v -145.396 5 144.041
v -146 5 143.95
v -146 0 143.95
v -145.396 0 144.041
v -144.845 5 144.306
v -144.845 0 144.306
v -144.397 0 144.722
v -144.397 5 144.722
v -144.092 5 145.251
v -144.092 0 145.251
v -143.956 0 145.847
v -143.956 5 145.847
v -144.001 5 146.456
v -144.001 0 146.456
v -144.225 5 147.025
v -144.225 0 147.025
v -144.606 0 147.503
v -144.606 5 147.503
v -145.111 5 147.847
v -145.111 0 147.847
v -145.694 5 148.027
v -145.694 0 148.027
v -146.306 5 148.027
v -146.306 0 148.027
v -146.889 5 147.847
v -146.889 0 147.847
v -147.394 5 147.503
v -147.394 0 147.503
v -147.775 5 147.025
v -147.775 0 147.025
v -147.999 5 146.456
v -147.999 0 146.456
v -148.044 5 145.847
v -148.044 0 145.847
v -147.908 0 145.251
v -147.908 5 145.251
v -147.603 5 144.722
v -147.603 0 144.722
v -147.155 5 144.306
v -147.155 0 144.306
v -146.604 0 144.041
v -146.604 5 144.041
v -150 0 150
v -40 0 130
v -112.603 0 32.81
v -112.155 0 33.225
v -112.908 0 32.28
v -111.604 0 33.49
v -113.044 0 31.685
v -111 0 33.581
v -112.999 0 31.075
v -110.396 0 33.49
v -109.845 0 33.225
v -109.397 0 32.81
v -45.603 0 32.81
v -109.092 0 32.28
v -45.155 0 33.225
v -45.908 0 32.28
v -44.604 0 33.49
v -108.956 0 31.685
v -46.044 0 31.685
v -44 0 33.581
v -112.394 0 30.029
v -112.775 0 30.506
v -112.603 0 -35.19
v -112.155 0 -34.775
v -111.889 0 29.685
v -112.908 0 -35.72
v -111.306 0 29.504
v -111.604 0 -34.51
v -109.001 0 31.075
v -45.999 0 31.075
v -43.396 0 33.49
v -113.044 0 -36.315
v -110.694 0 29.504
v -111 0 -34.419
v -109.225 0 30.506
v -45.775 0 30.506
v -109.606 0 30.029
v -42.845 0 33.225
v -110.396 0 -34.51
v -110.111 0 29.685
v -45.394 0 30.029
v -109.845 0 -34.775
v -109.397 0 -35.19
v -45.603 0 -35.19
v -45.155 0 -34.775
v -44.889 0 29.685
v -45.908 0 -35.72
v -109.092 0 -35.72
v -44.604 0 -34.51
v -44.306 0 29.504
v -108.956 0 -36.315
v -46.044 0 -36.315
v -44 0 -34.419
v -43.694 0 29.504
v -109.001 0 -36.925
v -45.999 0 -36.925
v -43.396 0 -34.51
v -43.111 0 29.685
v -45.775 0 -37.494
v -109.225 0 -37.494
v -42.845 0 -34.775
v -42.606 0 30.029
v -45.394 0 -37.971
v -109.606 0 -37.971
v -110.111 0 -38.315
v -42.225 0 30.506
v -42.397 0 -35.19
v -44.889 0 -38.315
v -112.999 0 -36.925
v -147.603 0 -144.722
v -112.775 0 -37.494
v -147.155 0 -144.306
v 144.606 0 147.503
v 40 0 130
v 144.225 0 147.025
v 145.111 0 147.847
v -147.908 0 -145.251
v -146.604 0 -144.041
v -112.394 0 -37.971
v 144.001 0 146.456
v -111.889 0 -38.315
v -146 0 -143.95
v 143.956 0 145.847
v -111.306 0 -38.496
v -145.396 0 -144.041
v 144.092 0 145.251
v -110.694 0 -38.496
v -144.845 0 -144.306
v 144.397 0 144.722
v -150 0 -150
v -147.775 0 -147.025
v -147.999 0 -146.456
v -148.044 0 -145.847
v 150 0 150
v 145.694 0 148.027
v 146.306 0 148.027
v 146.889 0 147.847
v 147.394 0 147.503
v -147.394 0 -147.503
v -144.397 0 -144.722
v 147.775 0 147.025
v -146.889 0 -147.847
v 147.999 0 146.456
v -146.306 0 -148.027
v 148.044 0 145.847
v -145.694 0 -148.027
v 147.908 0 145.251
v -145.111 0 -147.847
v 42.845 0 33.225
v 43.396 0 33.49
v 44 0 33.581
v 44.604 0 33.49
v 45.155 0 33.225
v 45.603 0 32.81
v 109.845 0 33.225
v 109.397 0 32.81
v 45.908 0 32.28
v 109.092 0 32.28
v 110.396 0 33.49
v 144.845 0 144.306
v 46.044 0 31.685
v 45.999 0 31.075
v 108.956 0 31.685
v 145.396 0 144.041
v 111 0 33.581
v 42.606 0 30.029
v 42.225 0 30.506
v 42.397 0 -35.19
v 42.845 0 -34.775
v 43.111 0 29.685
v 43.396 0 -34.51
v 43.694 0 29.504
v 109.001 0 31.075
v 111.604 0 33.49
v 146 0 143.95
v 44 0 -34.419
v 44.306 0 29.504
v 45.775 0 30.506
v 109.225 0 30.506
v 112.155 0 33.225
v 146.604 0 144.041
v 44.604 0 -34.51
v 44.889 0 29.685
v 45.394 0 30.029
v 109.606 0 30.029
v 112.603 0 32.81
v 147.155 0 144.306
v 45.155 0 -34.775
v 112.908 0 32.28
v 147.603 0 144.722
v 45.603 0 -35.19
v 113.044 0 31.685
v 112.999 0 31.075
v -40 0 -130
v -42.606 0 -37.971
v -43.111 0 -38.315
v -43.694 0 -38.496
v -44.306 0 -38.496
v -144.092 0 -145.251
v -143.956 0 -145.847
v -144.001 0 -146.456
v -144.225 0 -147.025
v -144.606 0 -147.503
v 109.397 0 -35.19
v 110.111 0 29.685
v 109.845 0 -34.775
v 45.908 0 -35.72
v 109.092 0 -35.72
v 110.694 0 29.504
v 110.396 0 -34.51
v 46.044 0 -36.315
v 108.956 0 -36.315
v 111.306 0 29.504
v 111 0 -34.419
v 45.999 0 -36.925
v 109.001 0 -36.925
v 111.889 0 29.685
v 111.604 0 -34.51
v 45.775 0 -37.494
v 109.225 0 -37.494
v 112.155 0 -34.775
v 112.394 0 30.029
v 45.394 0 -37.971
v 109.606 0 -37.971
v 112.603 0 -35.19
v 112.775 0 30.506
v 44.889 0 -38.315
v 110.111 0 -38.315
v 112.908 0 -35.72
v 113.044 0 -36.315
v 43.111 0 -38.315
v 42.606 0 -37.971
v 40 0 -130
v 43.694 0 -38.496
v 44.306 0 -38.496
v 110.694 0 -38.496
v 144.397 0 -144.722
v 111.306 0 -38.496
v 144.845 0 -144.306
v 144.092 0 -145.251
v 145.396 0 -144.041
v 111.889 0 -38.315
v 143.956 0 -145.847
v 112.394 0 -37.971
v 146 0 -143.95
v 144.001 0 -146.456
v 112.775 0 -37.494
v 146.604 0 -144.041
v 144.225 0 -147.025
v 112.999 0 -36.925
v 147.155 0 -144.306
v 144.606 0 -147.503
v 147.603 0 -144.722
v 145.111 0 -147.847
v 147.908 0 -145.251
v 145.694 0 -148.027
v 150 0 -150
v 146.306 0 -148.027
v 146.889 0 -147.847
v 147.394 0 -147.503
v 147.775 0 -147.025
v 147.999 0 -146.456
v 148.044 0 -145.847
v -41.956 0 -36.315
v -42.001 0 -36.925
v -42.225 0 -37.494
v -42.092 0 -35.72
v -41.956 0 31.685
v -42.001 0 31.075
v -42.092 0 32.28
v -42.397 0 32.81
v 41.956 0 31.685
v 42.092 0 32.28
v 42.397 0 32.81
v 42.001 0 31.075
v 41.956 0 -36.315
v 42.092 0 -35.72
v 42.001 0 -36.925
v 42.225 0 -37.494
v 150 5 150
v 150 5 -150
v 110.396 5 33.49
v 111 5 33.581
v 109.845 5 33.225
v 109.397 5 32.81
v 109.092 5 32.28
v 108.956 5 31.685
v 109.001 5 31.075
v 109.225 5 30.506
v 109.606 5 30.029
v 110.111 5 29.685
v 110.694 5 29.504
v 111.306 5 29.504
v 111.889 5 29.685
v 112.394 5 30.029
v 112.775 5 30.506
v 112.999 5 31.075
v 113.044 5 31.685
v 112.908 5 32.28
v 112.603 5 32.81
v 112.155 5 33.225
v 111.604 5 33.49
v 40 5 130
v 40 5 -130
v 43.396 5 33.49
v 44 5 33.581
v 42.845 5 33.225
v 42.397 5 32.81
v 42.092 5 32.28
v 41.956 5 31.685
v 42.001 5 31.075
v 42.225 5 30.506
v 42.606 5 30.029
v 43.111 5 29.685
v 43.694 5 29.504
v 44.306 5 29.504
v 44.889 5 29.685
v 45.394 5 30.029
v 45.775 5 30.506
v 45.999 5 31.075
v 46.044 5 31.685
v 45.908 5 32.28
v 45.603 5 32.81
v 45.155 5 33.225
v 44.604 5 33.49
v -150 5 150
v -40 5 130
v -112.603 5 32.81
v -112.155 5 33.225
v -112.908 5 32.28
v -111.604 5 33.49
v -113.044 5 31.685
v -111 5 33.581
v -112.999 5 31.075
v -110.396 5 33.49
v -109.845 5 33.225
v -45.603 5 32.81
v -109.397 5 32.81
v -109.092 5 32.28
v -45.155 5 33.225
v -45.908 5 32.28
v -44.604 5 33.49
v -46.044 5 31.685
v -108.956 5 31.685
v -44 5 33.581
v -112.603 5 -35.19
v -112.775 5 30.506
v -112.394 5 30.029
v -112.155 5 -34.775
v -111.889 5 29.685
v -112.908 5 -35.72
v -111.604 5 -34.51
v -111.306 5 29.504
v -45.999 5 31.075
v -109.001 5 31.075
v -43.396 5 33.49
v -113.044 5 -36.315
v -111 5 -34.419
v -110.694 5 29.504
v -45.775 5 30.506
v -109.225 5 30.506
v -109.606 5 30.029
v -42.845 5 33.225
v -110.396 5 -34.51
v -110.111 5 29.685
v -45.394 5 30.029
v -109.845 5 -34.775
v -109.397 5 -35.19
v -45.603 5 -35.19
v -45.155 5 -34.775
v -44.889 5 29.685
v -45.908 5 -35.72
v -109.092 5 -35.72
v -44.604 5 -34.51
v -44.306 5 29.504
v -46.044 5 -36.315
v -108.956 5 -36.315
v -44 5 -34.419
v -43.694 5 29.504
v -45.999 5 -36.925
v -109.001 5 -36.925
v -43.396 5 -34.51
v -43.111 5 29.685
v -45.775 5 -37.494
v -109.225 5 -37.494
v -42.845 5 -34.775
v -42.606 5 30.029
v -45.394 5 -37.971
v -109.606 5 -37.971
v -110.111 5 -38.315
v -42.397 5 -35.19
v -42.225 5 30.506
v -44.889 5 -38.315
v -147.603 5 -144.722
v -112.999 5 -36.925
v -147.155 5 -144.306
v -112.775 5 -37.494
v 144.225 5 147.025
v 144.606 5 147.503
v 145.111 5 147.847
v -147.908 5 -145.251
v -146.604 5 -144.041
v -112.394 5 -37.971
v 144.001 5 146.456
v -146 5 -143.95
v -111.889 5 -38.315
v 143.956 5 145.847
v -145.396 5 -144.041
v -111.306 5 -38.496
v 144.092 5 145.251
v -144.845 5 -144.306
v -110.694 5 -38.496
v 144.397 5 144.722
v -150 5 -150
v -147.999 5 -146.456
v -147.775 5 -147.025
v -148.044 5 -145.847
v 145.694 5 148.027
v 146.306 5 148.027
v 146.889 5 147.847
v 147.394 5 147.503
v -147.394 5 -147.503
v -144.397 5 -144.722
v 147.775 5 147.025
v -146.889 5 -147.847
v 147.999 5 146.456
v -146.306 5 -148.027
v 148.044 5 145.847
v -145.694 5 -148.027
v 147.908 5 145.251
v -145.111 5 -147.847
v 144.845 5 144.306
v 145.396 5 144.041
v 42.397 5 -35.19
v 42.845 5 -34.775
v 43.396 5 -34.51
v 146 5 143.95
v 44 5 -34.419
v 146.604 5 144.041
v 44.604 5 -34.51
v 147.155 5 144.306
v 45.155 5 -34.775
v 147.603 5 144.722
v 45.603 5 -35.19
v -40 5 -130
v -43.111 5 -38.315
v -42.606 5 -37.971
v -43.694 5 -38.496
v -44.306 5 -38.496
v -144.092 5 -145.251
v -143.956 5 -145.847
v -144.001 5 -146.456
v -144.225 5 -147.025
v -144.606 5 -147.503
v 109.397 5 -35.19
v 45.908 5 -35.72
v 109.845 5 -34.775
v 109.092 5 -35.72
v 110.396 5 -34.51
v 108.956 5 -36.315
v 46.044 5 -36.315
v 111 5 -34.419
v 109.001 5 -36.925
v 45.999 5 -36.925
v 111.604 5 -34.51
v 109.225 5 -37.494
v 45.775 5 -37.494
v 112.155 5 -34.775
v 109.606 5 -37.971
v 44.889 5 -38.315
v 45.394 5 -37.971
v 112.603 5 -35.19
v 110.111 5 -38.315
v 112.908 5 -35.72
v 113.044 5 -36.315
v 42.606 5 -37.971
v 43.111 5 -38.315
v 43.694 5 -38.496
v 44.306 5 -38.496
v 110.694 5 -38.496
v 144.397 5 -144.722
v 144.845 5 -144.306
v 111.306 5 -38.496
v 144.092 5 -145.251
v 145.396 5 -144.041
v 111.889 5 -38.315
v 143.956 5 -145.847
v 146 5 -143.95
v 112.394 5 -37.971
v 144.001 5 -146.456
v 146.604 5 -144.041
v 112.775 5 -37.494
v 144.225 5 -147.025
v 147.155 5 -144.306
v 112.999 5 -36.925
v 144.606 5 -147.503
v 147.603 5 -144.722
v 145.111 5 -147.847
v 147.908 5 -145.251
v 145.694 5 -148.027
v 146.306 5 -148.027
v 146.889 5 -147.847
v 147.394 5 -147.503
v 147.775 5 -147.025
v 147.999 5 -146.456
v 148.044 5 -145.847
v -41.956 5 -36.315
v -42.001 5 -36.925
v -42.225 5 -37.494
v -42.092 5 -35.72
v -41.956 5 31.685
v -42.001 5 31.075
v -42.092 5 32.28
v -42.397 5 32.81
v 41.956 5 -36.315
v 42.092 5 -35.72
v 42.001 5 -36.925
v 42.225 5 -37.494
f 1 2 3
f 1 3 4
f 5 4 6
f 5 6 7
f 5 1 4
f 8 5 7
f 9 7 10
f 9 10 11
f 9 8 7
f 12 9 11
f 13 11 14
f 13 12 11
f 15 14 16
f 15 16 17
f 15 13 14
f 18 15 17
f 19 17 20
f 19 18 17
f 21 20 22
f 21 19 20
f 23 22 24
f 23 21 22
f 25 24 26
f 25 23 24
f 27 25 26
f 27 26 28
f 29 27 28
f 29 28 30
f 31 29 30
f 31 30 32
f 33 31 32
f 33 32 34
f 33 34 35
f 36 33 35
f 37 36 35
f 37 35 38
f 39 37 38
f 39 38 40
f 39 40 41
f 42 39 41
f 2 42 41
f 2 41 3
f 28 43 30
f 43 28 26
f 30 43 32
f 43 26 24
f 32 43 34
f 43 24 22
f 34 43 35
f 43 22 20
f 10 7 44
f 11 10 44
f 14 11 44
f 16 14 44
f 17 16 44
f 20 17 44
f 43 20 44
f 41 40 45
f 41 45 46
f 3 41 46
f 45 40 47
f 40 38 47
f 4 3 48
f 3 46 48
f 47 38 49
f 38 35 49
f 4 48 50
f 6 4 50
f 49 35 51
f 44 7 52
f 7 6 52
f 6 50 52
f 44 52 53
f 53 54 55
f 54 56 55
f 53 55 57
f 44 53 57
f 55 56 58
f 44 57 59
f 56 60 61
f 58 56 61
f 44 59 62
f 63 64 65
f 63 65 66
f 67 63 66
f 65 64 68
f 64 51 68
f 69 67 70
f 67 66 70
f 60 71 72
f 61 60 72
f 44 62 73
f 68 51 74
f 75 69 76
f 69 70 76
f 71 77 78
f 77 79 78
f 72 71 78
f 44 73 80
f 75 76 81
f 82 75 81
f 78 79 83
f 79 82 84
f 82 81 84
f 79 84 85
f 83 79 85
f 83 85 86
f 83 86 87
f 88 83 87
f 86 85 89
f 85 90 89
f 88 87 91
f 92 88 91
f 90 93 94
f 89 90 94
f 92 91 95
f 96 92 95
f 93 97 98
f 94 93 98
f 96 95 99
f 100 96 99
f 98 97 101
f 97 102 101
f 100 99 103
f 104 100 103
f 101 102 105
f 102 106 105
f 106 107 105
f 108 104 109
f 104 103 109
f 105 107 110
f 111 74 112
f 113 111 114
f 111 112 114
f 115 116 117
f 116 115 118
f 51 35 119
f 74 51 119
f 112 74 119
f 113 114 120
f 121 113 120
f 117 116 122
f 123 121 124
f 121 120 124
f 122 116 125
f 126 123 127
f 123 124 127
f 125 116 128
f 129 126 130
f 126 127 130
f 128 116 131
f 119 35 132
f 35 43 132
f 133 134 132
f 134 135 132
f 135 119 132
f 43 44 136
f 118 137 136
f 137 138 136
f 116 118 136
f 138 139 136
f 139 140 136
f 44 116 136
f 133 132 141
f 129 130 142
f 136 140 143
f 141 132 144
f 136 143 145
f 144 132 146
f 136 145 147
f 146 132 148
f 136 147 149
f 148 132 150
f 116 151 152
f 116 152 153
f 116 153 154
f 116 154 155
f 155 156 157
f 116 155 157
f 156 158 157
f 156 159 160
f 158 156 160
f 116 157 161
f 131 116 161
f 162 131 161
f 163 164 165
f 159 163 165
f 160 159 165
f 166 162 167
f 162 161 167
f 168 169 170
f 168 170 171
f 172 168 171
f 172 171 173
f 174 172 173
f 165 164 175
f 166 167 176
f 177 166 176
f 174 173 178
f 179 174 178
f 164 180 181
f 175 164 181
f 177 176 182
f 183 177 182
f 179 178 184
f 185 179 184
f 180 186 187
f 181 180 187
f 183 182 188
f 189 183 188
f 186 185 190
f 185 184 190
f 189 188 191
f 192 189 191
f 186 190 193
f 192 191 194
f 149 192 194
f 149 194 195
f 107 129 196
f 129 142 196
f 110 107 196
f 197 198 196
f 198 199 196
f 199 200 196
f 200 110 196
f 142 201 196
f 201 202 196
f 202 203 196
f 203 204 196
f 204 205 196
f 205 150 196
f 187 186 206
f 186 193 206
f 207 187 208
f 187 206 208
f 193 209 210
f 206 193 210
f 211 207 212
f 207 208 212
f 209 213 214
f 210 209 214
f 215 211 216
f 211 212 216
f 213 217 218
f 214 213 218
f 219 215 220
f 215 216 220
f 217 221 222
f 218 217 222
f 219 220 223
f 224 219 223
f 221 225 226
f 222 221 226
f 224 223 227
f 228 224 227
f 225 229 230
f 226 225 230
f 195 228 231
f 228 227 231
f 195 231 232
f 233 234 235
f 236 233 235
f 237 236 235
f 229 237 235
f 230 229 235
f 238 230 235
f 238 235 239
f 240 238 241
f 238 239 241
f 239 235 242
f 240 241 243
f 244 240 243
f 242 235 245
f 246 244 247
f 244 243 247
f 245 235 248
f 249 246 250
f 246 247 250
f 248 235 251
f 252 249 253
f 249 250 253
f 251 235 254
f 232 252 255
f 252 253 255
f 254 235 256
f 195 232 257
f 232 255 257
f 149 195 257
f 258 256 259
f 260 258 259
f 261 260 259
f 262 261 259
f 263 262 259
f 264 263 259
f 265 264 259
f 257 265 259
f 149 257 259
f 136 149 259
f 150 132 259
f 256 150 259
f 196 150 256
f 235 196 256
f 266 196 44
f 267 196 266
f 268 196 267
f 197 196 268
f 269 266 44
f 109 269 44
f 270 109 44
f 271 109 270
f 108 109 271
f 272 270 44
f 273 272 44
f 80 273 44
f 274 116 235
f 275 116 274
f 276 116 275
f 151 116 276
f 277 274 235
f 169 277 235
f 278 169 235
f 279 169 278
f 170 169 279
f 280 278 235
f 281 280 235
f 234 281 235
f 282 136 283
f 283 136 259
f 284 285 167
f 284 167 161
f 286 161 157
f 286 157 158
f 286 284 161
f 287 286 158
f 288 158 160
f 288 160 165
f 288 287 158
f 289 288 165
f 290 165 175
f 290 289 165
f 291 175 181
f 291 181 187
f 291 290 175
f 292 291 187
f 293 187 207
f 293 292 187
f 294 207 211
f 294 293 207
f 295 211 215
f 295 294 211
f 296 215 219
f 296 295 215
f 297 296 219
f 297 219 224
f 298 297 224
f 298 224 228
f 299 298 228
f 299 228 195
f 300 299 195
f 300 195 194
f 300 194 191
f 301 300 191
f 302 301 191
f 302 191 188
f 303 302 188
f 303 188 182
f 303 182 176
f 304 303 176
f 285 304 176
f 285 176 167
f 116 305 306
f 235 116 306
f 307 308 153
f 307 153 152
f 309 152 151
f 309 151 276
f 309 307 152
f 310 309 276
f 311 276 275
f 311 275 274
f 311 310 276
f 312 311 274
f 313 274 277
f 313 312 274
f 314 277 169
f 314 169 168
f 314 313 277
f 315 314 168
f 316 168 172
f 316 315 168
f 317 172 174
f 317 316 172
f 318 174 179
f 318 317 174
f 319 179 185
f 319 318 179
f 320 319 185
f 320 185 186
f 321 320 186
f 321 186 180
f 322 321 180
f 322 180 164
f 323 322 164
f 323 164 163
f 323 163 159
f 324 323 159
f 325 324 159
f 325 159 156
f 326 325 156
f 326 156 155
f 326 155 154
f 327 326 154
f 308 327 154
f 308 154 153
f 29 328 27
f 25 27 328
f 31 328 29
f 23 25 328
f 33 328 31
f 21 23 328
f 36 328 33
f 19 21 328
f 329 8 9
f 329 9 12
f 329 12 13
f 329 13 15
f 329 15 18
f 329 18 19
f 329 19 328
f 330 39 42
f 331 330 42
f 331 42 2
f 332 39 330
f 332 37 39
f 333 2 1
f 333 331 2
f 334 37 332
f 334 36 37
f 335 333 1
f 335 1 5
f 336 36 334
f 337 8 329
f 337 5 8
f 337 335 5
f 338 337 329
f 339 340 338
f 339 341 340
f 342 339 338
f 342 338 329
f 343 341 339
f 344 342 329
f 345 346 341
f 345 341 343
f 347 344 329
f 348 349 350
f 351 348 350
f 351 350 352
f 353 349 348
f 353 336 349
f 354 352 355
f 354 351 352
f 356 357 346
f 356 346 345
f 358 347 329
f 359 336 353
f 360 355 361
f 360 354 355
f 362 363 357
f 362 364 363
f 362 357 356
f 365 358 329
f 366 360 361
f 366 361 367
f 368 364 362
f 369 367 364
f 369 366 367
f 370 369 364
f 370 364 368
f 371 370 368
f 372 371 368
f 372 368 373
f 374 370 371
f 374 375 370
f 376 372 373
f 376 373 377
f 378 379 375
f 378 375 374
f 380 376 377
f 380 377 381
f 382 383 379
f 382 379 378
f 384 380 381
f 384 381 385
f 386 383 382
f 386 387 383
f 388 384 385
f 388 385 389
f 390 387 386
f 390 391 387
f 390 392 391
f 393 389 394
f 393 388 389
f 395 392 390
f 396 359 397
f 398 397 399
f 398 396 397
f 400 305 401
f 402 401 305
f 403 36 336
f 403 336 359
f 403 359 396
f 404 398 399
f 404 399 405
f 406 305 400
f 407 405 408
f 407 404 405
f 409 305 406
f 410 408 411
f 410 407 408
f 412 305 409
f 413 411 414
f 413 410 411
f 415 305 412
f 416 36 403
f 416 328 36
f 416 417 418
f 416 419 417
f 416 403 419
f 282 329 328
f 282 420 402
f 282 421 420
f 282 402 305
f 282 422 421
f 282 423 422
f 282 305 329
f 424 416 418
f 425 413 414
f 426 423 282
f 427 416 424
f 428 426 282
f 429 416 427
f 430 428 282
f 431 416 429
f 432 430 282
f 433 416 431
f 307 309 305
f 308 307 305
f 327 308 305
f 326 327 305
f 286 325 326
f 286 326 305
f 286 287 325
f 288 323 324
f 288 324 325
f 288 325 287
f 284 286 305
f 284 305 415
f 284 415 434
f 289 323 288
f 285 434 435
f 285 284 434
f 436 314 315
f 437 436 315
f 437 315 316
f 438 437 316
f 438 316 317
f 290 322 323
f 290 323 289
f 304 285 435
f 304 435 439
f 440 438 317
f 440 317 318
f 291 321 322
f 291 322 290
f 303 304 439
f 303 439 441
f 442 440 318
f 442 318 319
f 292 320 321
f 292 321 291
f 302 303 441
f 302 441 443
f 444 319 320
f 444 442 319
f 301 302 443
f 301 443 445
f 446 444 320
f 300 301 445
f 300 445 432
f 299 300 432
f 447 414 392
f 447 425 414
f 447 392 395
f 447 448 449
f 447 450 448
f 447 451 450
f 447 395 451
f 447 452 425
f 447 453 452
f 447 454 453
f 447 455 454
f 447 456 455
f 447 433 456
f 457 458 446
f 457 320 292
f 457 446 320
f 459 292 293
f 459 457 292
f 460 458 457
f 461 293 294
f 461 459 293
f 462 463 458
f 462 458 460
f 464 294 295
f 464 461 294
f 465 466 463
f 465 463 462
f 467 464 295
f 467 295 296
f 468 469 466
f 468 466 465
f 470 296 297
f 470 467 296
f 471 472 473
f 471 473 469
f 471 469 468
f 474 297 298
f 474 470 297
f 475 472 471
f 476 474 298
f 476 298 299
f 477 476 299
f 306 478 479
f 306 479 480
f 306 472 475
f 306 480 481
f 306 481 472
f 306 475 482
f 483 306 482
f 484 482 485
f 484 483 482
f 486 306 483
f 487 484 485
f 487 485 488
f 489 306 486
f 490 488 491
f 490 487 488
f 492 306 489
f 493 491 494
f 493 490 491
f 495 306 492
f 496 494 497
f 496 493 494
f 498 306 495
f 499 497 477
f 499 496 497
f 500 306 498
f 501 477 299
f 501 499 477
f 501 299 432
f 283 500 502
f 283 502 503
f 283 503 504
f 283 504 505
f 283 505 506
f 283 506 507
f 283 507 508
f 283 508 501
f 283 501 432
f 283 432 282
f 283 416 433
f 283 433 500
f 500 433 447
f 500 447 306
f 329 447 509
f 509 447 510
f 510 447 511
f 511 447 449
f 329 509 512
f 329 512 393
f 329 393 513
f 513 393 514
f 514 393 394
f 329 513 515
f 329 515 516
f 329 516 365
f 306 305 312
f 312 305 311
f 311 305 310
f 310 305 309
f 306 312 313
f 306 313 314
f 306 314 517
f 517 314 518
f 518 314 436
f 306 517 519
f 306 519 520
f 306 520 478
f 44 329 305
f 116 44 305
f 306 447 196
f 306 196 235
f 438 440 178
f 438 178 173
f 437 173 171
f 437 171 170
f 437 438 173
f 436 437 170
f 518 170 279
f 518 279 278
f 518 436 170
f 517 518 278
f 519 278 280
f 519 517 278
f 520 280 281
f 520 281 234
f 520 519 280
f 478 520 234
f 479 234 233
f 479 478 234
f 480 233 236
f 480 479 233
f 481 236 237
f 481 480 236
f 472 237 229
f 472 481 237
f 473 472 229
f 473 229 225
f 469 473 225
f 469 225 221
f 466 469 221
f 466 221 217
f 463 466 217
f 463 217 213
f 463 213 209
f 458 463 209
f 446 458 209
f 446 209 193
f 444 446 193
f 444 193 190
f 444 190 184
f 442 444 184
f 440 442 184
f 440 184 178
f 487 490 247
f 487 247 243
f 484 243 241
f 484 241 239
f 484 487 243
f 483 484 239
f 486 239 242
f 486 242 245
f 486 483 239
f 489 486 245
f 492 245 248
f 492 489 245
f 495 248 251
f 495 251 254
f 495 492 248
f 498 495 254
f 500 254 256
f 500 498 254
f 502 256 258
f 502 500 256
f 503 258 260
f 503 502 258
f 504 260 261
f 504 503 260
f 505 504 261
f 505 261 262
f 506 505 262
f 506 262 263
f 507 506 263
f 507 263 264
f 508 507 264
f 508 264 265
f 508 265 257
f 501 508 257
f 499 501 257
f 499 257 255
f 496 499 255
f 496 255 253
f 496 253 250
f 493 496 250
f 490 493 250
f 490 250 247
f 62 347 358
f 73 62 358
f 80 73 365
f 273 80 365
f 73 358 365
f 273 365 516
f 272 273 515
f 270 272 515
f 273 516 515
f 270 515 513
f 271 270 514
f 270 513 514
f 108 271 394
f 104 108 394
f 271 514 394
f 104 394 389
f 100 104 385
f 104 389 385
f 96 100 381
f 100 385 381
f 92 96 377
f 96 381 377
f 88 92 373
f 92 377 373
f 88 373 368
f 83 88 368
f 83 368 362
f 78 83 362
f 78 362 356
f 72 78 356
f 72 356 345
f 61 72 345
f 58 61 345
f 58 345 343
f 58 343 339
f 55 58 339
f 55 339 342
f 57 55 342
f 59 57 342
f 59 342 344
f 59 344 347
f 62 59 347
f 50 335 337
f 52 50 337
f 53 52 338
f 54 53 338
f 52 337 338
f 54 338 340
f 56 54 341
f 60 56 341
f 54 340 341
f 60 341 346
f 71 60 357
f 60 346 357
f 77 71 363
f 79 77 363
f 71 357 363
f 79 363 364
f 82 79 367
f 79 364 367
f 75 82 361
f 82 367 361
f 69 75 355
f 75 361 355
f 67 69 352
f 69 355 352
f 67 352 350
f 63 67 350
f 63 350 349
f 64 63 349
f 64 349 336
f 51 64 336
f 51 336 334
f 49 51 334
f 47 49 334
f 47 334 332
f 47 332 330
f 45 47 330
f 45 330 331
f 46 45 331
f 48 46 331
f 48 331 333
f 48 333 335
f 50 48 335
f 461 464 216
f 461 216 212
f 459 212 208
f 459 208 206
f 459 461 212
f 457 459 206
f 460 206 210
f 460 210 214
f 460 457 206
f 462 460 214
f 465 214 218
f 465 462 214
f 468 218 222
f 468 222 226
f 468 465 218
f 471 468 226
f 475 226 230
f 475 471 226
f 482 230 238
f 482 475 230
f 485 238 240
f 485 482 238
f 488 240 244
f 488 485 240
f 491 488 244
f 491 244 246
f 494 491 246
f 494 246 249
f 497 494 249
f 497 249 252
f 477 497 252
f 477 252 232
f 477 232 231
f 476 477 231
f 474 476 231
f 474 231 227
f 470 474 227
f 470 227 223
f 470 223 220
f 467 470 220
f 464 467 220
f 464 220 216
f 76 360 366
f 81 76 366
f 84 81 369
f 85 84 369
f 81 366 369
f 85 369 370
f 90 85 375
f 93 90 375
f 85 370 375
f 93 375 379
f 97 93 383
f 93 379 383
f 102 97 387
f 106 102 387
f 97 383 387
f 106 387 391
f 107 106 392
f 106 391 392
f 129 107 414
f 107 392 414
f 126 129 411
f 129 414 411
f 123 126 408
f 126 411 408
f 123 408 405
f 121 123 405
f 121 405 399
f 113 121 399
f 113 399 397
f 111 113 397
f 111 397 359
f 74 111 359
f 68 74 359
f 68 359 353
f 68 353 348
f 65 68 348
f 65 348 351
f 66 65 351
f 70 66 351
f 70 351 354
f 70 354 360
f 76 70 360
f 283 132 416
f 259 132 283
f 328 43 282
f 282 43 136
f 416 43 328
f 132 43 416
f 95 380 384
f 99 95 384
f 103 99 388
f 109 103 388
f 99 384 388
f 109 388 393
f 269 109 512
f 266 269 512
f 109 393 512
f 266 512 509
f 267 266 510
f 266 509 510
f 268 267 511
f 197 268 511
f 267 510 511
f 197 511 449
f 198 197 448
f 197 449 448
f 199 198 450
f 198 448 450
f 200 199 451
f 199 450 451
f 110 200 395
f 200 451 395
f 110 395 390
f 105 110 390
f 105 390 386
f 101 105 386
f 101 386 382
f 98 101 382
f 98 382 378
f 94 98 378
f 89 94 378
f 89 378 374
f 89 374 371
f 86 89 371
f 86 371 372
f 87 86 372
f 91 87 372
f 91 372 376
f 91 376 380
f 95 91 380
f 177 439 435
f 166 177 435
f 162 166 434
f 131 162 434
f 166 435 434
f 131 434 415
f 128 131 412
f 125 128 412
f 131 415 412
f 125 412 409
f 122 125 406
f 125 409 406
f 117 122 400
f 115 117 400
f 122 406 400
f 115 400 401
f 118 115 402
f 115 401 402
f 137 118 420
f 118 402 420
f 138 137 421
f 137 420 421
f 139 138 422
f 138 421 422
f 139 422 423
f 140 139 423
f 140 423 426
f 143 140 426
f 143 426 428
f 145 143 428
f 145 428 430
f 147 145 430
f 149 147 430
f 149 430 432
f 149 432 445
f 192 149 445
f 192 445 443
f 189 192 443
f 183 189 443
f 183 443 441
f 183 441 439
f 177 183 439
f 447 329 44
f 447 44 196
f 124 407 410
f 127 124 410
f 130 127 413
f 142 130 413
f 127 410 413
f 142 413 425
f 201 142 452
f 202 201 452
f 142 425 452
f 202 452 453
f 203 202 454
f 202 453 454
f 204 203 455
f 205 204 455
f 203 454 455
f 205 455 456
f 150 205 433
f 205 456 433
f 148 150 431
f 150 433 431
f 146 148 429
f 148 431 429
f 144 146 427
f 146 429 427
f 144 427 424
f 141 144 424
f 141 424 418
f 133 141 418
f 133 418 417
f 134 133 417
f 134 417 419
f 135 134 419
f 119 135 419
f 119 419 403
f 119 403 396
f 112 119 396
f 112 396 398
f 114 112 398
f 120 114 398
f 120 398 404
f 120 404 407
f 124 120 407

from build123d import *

# Parameters (mm, degrees)
SKETCH1_W                                  = 300
SKETCH1_H                                  = 300
BOSS_EXTRUDE1_DEPTH                        = 5
CUT_EXTRUDE1_REACH                         = 214.191
SKETCH2_R                                  = 2.05
MIRROR1_AT_THE_SECOND_PLANE_COPY_1_REACH   = 214.191
MIRROR1_AT_THE_SECOND_PLANE_COPY_1_SKETC_R = 2.05
CUT_EXTRUDE2_REACH                         = 214.191
SKETCH3_W                                  = 80
SKETCH3_H                                  = 260
CUT_EXTRUDE3_REACH                         = 214.191
SKETCH4_R                                  = 2.05


with BuildPart() as part:
    # Sketch1 → Boss-Extrude1 (new body)
    with BuildSketch(Plane(origin=(0, 0, 0), x_dir=(1, 0, 0), z_dir=(0, 1, 0))):
        Rectangle(SKETCH1_W, SKETCH1_H)
    extrude(amount=BOSS_EXTRUDE1_DEPTH)

    # Sketch2 → Cut-Extrude1 (cut, up to next)
    with BuildSketch(Plane(origin=(0, 5, 0), x_dir=(1, 0, 0), z_dir=(0, 1, 0)), mode=Mode.PRIVATE) as cut_extrude1_sk1:
        with Locations(Location((-146, 146, 0), (0, 0, 270))):
            Circle(SKETCH2_R)
    cut_extrude1_tool1 = extrude(cut_extrude1_sk1.sketch, amount=-CUT_EXTRUDE1_REACH, mode=Mode.PRIVATE) & part.part
    cut_extrude1 = cut_extrude1_tool1.solids().sort_by_distance((-146, 5, -146))[0]
    add(cut_extrude1, mode=Mode.SUBTRACT)

    # Mirror1: Cut-Extrude1 across plane
    add(cut_extrude1.mirror(Plane(origin=(0, 0, 0), x_dir=(0, 0, 1), z_dir=(1, 0, 0))), mode=Mode.SUBTRACT)

    # Mirror1 at the second plane: Cut-Extrude1 across plane
    add(cut_extrude1.mirror(Plane.XY), mode=Mode.SUBTRACT)

    # Mirror1 at the second plane copy 1 sketc → Mirror1 at the second plane copy 1 (cut, up to next)
    with BuildSketch(Plane(origin=(0, 5, 0), x_dir=(-1, 0, 0), z_dir=(0, 1, 0)), mode=Mode.PRIVATE) as mirror1_at_the_second_plane_copy_1_sk1:
        with Locations(Location((-146, 146, 0), (0, 0, 270))):
            Circle(MIRROR1_AT_THE_SECOND_PLANE_COPY_1_SKETC_R)
    mirror1_at_the_second_plane_copy_1_tool1 = extrude(mirror1_at_the_second_plane_copy_1_sk1.sketch, amount=-MIRROR1_AT_THE_SECOND_PLANE_COPY_1_REACH, mode=Mode.PRIVATE) & part.part
    add(mirror1_at_the_second_plane_copy_1_tool1.solids().sort_by_distance((146, 5, 146))[0], mode=Mode.SUBTRACT)

    # Sketch3 → Cut-Extrude2 (cut, up to next)
    with BuildSketch(Plane(origin=(0, 5, 0), x_dir=(1, 0, 0), z_dir=(0, 1, 0)), mode=Mode.PRIVATE) as cut_extrude2_sk1:
        Rectangle(SKETCH3_W, SKETCH3_H)
    cut_extrude2_tool1 = extrude(cut_extrude2_sk1.sketch, amount=-CUT_EXTRUDE2_REACH, mode=Mode.PRIVATE) & part.part
    add(cut_extrude2_tool1.solids().sort_by_distance((0, 5, 0))[0], mode=Mode.SUBTRACT)

    # Sketch4 → Cut-Extrude3 (cut, up to next)
    with BuildSketch(Plane(origin=(0, 5, 0), x_dir=(1, 0, 0), z_dir=(0, 1, 0)), mode=Mode.PRIVATE) as cut_extrude3_sk1:
        with Locations(Location((-111, 36.46851285, 0), (0, 0, 270))):
            Circle(SKETCH4_R)
    cut_extrude3_tool1 = extrude(cut_extrude3_sk1.sketch, amount=-CUT_EXTRUDE3_REACH, mode=Mode.PRIVATE) & part.part
    # Sketch4 → Cut-Extrude3 (cut, up to next)
    with BuildSketch(Plane(origin=(0, 5, 0), x_dir=(1, 0, 0), z_dir=(0, 1, 0)), mode=Mode.PRIVATE) as cut_extrude3_sk2:
        with Locations(Location((-44, 36.46851285, 0), (0, 0, 270))):
            Circle(SKETCH4_R)
    cut_extrude3_tool2 = extrude(cut_extrude3_sk2.sketch, amount=-CUT_EXTRUDE3_REACH, mode=Mode.PRIVATE) & part.part
    # Sketch4 → Cut-Extrude3 (cut, up to next)
    with BuildSketch(Plane(origin=(0, 5, 0), x_dir=(1, 0, 0), z_dir=(0, 1, 0)), mode=Mode.PRIVATE) as cut_extrude3_sk3:
        with Locations(Location((-44, -31.53148715, 0), (0, 0, 270))):
            Circle(SKETCH4_R)
    cut_extrude3_tool3 = extrude(cut_extrude3_sk3.sketch, amount=-CUT_EXTRUDE3_REACH, mode=Mode.PRIVATE) & part.part
    # Sketch4 → Cut-Extrude3 (cut, up to next)
    with BuildSketch(Plane(origin=(0, 5, 0), x_dir=(1, 0, 0), z_dir=(0, 1, 0)), mode=Mode.PRIVATE) as cut_extrude3_sk4:
        with Locations(Location((-111, -31.53148715, 0), (0, 0, 270))):
            Circle(SKETCH4_R)
    cut_extrude3_tool4 = extrude(cut_extrude3_sk4.sketch, amount=-CUT_EXTRUDE3_REACH, mode=Mode.PRIVATE) & part.part
    cut_extrude3_1 = cut_extrude3_tool1.solids().sort_by_distance((-111, 5, -36.468513))[0]
    add(cut_extrude3_1, mode=Mode.SUBTRACT)
    cut_extrude3_2 = cut_extrude3_tool2.solids().sort_by_distance((-44, 5, -36.468513))[0]
    add(cut_extrude3_2, mode=Mode.SUBTRACT)
    cut_extrude3_3 = cut_extrude3_tool3.solids().sort_by_distance((-44, 5, 31.531487))[0]
    add(cut_extrude3_3, mode=Mode.SUBTRACT)
    cut_extrude3_4 = cut_extrude3_tool4.solids().sort_by_distance((-111, 5, 31.531487))[0]
    add(cut_extrude3_4, mode=Mode.SUBTRACT)
    cut_extrude3 = cut_extrude3_1 + cut_extrude3_2 + cut_extrude3_3 + cut_extrude3_4  # Cut-Extrude3 as one shape, for the pattern or mirror that repeats it

    # Mirror2: Cut-Extrude3 across plane
    add(cut_extrude3.mirror(Plane(origin=(0, 0, 0), x_dir=(0, 0, 1), z_dir=(1, 0, 0))), mode=Mode.SUBTRACT)


solid = part.part
